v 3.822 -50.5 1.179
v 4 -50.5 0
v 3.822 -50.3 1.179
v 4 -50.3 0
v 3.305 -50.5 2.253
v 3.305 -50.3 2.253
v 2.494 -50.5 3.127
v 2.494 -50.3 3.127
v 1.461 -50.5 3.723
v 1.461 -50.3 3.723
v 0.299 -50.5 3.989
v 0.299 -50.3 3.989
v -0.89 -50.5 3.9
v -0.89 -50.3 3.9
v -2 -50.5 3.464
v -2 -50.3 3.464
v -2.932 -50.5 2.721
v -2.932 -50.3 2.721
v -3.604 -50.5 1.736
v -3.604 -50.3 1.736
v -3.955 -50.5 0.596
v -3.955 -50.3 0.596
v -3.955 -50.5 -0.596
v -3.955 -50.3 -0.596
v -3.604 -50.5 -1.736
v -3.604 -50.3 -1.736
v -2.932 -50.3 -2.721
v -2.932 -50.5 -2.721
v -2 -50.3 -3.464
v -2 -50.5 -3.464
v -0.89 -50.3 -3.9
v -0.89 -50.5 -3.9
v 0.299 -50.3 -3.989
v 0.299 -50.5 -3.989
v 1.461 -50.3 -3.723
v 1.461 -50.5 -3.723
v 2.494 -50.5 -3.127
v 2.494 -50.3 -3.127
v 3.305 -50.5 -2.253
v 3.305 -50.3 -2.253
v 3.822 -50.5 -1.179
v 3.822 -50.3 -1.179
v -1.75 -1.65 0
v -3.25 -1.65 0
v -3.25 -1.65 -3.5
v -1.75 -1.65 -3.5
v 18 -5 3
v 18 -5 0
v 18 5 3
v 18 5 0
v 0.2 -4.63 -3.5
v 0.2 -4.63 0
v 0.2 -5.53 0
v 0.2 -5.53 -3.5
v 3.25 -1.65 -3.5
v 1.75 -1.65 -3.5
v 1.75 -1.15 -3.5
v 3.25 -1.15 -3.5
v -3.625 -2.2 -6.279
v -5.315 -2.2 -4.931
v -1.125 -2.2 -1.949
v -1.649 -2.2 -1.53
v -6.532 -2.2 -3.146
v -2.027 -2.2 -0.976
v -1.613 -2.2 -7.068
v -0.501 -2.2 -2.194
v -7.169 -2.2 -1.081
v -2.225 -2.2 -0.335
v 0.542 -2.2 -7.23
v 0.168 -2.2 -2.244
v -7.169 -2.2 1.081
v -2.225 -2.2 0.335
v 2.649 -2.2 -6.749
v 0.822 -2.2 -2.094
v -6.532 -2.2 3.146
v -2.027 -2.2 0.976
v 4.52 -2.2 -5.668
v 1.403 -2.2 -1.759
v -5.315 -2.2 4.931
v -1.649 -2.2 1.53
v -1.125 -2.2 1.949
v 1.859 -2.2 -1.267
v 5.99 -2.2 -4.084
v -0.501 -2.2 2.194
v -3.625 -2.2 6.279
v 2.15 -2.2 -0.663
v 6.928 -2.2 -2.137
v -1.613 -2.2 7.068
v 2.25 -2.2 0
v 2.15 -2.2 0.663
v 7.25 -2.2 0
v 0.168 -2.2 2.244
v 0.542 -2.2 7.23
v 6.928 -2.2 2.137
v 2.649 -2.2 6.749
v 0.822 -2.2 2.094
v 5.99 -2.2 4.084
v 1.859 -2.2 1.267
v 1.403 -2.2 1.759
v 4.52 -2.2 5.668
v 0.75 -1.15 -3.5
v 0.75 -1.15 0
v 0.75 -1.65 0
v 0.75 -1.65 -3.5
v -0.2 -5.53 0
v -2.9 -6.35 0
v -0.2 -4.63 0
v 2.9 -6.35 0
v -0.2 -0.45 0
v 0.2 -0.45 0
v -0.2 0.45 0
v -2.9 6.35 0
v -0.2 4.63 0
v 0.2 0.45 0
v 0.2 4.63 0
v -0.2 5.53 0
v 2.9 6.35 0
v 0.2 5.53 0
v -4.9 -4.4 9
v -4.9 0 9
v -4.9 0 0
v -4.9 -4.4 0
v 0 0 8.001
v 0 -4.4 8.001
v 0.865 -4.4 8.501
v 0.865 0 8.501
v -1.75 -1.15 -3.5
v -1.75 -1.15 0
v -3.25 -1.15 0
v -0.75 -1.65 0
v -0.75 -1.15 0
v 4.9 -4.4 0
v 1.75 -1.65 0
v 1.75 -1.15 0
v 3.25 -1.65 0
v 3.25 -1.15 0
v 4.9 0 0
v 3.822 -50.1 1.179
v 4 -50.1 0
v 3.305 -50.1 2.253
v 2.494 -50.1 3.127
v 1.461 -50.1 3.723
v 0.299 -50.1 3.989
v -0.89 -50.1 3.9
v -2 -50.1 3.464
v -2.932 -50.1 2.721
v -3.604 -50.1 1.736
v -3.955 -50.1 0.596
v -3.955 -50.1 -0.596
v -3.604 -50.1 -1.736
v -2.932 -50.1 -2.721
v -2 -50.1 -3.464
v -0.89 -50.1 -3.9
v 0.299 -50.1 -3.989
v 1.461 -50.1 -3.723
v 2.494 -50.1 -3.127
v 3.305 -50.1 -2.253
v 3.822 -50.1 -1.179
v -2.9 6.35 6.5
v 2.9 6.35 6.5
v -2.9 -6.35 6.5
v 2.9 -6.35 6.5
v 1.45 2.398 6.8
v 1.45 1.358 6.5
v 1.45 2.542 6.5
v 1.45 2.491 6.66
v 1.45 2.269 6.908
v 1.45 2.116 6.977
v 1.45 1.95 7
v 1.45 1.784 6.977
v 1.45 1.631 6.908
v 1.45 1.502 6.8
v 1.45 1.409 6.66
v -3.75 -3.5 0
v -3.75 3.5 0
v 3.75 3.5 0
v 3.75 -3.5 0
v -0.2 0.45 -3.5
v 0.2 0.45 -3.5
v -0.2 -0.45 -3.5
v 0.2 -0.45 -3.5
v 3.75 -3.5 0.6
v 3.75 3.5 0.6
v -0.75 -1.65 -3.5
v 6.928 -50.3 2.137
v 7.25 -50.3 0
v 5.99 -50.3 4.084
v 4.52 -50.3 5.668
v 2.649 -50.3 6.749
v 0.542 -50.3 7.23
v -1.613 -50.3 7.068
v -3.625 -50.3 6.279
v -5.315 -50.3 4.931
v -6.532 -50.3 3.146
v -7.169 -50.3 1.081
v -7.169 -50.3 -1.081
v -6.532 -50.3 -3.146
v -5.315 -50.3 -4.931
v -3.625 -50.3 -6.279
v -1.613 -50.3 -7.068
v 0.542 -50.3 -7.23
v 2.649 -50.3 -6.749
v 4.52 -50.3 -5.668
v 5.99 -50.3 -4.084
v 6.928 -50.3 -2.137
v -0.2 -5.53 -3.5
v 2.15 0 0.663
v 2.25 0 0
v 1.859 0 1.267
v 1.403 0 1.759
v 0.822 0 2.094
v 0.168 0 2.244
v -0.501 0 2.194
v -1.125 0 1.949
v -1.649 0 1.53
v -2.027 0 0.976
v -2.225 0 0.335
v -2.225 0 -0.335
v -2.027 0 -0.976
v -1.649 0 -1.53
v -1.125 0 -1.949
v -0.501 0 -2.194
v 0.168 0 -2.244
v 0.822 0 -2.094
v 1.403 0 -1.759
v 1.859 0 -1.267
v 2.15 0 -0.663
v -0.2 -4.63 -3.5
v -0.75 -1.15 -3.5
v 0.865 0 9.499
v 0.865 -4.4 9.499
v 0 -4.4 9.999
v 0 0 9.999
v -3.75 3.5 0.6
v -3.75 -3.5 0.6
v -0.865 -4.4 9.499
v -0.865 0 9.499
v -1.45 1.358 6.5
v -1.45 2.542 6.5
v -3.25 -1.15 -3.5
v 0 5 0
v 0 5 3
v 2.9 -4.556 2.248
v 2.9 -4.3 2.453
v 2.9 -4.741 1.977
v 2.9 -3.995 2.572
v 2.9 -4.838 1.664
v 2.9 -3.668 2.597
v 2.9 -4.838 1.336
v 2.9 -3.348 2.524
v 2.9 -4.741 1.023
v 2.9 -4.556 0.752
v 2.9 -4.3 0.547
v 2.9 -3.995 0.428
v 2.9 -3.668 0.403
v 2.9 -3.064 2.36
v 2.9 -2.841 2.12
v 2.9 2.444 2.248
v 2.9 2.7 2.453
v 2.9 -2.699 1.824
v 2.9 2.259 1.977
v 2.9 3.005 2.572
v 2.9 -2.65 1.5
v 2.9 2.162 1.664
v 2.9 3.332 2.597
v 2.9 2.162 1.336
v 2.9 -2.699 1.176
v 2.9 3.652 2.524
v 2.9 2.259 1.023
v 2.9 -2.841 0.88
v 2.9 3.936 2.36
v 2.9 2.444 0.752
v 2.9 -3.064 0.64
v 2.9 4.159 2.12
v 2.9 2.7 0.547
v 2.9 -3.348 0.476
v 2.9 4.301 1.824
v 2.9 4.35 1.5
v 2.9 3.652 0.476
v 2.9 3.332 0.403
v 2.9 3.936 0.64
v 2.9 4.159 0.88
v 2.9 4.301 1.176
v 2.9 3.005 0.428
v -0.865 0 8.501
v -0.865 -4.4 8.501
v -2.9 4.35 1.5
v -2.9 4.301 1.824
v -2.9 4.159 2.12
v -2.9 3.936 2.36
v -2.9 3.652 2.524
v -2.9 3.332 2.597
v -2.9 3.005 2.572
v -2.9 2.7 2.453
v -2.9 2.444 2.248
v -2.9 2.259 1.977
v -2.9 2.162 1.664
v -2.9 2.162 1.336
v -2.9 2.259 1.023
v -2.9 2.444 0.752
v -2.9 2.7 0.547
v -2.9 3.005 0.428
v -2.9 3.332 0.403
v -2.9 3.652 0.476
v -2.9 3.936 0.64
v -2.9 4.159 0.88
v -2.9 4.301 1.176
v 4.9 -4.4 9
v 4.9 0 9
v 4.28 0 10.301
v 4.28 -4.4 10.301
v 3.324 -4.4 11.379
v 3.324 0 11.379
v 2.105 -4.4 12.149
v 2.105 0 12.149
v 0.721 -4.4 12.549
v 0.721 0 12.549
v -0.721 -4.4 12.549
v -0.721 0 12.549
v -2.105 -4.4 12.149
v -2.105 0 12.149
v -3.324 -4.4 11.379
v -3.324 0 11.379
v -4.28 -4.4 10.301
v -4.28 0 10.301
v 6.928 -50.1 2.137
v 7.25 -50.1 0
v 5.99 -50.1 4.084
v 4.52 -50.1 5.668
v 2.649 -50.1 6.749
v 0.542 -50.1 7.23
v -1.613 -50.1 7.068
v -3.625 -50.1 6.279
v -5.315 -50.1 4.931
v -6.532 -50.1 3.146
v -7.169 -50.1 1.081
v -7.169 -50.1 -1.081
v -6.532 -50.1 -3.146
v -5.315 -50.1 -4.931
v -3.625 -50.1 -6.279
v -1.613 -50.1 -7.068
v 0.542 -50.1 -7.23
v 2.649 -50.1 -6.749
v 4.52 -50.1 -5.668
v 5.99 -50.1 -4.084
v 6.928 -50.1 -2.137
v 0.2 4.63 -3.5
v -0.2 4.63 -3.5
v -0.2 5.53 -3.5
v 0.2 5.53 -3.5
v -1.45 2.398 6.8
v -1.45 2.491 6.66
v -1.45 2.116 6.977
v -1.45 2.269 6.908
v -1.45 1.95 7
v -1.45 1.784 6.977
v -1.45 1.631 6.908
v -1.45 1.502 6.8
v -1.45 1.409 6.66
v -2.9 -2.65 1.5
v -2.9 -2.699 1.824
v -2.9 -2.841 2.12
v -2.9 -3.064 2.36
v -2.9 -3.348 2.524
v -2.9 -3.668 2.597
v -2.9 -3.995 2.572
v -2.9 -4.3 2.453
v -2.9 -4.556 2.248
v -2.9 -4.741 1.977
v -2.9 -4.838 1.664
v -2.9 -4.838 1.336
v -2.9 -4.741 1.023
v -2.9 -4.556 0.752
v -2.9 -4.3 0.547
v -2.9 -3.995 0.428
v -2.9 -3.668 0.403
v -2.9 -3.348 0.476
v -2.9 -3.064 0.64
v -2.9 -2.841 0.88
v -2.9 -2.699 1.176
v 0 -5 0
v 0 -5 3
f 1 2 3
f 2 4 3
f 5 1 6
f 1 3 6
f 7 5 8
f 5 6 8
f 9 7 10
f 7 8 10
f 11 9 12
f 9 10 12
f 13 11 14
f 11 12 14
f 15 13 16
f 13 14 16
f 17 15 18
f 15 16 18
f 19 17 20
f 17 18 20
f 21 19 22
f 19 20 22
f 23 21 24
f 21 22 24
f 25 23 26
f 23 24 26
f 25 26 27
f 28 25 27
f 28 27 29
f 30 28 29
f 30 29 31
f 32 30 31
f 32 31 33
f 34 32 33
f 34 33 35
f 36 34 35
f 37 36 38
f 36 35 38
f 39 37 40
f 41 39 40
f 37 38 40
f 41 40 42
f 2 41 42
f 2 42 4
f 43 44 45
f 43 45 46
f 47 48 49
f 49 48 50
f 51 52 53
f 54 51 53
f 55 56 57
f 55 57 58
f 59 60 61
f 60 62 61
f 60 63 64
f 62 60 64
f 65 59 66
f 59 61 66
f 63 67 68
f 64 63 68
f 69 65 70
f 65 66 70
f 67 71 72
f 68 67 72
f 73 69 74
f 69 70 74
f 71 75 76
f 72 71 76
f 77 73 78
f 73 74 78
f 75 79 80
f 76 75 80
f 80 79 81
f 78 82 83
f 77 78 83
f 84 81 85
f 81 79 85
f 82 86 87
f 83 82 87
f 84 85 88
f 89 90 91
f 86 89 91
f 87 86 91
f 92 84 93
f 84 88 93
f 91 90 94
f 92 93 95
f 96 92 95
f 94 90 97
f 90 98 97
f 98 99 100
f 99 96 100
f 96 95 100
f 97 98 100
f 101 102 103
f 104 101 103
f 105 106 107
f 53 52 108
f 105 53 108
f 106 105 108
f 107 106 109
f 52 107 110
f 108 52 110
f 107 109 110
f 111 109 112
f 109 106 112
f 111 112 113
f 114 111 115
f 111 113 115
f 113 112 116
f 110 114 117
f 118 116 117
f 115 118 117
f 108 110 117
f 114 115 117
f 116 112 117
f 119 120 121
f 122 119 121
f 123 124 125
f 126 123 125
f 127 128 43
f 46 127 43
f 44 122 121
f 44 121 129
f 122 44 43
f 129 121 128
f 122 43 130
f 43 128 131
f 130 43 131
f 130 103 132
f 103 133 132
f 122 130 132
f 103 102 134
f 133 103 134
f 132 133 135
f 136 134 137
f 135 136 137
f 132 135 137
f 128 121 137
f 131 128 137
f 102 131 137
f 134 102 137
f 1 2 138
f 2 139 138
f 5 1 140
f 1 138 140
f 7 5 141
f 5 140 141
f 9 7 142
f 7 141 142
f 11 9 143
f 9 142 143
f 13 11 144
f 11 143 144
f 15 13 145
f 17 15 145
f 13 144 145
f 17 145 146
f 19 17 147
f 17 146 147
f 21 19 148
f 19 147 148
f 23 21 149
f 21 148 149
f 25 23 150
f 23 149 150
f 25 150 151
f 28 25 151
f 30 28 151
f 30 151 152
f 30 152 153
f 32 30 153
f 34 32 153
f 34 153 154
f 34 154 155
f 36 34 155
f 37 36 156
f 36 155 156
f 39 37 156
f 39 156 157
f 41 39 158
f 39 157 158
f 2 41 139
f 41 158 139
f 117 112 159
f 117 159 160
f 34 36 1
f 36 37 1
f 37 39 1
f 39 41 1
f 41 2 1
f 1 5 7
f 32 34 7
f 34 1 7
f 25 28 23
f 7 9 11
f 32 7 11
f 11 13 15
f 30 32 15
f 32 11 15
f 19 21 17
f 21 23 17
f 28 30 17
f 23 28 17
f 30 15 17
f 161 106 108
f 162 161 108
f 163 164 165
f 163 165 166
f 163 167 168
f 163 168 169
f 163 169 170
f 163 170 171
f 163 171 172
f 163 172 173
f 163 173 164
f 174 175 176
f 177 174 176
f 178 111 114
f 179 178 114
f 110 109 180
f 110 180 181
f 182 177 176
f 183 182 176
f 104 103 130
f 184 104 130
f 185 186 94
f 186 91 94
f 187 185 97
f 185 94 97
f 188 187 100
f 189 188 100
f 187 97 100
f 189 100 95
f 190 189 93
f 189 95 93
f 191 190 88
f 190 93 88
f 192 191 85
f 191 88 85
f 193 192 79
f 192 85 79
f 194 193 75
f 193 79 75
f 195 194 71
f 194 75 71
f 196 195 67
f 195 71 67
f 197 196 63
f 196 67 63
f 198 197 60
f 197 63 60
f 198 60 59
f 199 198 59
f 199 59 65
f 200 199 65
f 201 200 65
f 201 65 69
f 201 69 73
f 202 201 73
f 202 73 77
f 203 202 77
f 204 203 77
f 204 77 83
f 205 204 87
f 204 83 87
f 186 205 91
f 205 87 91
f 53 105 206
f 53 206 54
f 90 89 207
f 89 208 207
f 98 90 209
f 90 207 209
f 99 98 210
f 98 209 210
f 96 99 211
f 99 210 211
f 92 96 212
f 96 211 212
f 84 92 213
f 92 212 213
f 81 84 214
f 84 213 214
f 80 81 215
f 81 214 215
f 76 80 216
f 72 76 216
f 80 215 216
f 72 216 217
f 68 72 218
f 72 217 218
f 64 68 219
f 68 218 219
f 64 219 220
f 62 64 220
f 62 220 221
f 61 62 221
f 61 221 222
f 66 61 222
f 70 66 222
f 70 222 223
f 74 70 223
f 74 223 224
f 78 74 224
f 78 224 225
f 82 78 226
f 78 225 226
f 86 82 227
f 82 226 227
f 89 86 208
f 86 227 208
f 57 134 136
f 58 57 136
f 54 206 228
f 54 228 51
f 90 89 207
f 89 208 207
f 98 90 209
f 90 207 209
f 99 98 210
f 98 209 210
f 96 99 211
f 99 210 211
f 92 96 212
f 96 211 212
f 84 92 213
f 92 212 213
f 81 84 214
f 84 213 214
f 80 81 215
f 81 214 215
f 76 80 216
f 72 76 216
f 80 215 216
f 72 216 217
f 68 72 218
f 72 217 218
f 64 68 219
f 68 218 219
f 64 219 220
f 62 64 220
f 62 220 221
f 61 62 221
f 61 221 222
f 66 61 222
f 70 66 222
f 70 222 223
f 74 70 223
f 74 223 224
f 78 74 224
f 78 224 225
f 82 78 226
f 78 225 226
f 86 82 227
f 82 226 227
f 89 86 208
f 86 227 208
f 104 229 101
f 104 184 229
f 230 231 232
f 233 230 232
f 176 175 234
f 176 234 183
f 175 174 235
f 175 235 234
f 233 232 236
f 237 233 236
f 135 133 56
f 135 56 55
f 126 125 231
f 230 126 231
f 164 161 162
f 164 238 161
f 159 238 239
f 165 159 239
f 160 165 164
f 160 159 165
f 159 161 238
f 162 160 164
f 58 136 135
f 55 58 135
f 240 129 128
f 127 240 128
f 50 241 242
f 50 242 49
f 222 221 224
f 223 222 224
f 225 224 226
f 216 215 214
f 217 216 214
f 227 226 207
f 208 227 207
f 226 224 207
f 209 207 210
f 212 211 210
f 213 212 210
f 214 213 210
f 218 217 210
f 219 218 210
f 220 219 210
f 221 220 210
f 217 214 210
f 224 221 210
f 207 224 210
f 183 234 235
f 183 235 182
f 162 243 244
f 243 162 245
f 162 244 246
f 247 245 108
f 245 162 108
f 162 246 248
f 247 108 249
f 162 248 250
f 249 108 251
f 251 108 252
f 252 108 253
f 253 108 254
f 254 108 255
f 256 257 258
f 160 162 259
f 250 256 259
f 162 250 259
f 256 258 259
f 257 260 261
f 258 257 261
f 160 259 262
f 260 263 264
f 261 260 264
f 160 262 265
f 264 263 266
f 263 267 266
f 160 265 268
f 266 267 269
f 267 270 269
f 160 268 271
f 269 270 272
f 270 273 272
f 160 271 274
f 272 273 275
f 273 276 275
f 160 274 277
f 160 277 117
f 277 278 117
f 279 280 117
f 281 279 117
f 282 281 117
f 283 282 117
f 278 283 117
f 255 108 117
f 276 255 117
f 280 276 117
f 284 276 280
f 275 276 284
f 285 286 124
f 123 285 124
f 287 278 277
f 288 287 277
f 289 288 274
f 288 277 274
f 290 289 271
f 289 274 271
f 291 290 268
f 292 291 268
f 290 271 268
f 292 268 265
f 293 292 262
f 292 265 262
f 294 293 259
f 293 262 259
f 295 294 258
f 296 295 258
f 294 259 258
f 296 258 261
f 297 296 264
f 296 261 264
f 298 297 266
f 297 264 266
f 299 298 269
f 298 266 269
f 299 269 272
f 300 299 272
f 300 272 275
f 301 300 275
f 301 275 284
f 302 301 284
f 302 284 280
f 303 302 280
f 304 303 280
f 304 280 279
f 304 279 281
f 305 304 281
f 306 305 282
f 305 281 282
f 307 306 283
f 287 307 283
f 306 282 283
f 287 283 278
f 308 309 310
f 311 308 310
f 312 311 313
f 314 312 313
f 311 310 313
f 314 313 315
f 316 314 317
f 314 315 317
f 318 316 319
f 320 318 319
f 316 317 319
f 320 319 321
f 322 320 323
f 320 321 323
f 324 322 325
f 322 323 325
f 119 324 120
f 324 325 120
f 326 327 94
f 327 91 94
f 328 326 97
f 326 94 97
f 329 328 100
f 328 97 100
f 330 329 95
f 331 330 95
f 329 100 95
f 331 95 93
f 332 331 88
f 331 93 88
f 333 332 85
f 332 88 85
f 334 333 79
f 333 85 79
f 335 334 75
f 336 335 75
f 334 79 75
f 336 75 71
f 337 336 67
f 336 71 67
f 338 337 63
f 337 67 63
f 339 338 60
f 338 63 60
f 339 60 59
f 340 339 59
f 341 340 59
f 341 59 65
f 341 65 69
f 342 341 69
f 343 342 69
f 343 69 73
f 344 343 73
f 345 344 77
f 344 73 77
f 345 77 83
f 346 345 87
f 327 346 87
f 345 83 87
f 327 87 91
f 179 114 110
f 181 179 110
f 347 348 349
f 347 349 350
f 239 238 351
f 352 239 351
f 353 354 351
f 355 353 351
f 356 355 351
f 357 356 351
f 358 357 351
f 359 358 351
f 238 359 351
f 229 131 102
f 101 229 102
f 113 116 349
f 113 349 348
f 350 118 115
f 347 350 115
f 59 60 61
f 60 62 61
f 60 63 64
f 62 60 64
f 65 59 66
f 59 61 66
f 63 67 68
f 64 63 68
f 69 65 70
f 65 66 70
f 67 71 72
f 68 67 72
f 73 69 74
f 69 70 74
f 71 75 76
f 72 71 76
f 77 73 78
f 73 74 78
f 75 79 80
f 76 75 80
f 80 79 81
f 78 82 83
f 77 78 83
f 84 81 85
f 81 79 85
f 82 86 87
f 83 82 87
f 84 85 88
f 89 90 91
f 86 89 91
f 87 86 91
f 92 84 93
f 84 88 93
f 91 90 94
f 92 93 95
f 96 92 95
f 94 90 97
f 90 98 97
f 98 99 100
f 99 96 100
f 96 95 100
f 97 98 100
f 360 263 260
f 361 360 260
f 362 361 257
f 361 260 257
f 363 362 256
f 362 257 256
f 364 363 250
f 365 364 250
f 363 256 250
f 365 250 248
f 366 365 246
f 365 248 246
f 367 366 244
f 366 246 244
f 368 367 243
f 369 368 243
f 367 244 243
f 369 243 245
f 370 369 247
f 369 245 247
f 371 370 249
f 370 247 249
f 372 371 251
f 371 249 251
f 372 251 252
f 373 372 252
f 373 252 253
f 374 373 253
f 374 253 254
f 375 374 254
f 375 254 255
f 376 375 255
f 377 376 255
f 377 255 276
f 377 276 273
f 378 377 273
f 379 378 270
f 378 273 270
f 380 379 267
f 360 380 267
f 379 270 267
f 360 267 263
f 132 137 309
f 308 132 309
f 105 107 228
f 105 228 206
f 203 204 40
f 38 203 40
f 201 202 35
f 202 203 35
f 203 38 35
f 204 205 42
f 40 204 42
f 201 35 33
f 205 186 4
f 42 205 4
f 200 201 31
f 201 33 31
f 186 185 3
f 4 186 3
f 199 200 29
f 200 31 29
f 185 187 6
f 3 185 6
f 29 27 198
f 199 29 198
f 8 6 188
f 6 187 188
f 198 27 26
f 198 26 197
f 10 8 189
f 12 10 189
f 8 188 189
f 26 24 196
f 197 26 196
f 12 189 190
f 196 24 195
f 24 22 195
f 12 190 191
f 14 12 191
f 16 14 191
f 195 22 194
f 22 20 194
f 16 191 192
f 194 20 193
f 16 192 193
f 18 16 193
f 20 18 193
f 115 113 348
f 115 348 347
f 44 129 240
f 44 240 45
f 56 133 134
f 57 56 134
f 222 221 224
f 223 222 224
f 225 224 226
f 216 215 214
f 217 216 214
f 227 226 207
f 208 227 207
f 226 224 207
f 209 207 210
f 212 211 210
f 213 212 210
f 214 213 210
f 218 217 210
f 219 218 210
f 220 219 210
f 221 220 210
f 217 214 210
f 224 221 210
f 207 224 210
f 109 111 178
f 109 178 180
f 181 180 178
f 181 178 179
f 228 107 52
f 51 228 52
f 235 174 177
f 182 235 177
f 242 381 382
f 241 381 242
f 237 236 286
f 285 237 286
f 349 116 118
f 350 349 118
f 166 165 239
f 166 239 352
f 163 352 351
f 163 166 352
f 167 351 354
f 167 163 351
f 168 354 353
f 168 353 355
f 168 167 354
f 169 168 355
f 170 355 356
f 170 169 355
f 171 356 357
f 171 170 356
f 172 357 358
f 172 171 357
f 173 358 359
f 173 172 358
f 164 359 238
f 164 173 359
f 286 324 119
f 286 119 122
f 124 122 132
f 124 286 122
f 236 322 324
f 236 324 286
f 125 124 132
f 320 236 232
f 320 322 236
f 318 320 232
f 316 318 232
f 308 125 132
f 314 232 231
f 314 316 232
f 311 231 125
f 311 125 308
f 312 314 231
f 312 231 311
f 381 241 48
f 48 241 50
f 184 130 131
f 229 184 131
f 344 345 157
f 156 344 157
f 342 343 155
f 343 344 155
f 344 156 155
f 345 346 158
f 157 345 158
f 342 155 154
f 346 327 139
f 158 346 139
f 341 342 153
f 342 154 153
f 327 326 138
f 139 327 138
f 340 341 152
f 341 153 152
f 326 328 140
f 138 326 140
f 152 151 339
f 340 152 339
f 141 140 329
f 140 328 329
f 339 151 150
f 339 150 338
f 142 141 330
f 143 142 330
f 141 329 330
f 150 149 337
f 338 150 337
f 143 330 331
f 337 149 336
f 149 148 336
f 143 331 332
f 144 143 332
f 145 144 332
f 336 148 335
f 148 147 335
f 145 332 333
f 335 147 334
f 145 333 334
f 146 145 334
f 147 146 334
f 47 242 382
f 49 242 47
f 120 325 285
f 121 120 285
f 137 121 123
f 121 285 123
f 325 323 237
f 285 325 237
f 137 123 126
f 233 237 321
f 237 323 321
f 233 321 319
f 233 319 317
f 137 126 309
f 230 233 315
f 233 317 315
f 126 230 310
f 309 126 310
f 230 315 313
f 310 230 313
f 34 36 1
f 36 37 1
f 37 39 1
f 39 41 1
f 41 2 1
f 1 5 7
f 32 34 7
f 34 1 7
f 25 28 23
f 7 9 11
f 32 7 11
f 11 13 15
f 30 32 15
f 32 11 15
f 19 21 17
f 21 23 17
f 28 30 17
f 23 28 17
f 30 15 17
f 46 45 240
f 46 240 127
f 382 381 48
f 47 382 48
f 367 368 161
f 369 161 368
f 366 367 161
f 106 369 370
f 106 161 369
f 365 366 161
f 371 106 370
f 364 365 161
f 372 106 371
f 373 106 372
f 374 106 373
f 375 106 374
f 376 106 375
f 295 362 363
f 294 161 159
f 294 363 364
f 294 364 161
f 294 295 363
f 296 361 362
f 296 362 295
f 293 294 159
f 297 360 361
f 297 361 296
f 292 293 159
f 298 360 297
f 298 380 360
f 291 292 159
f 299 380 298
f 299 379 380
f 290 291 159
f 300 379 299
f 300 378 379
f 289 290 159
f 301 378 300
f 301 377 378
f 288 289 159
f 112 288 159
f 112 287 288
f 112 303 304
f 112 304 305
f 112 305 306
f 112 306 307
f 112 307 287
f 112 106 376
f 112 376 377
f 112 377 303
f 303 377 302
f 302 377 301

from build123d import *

# Parameters (mm, degrees)
F0_W      = 5.8
F0_H      = 12.7
F1_DEPTH  = 6.5
F2_W      = 0.4
F2_H      = 0.9
F3_DEPTH  = 3.5
F4_R      = 0.6
F5_DEPTH  = 1.45
F6_R      = 1.1
F7_DEPTH  = 5.8
F10_W     = 18
F10_H     = 10
F11_DEPTH = 3
F12_W     = 7.5
F12_H     = 7
F13_DEPTH = 0.6
F15_DEPTH = 4.4
F17_DEPTH = 4.4
F18_W     = 1.5
F18_H     = 0.25
F18_H_2   = 0.5
F19_DEPTH = 3.5


with BuildPart() as f1:
    # F0 (on Top) → F1 (new body)
    with BuildSketch(Plane.XY):
        Rectangle(F0_W, F0_H)
    extrude(amount=F1_DEPTH)

    # F2 (on face) → F3 (join)
    with BuildSketch(Plane(origin=(0, 0, 0), x_dir=(1, 0, 0), z_dir=(0, 0, -1))):
        with Locations((0, 5.08)):
            Rectangle(F2_W, F2_H)
        Rectangle(F2_W, F2_H)
        with Locations((0, -5.08)):
            Rectangle(F2_W, F2_H)
    extrude(amount=F3_DEPTH)

    # F4 (on Right) → F5 (join, symmetric)
    with BuildSketch(Plane.YZ):
        with Locations((1.95, 6.4)):
            Circle(F4_R)
    extrude(amount=F5_DEPTH, both=True)

    # F6 (on face) → F7 (cut, through all)
    with BuildSketch(Plane.YZ.offset(2.9)):
        with Locations((3.25, 1.5)):
            Circle(F6_R)
        with Locations((-3.75, 1.5)):
            Circle(F6_R)
    extrude(amount=-F7_DEPTH, mode=Mode.SUBTRACT)


with BuildPart() as f9:
    # F8 (on Top) → F9 (revolve)
    with BuildSketch(Plane.XY):
        Polygon((2.25, 0), (0, 0), (0, -50.5), (4, -50.5), (4, -50.3), (7.25, -50.3), (7.25, -2.2), (2.25, -2.2), align=None)
    revolve(axis=Axis((0, 14.5285641775, 0), (0, -1, 0)))


with BuildPart() as f11:
    # F10 (on Top) → F11 (new body)
    with BuildSketch(Plane.XY):
        with Locations((9, 0)):
            Rectangle(F10_W, F10_H)
    extrude(amount=F11_DEPTH)


with BuildPart() as f13:
    # F12 (on Top) → F13 (new body)
    with BuildSketch(Plane.XY):
        Rectangle(F12_W, F12_H)
    extrude(amount=F13_DEPTH)


with BuildPart() as f15:
    # F14 (on Front) → F15 (new body)
    with BuildSketch(Plane.XZ):
        with BuildLine():
            Line((-4.9, 0), (4.9, 0))
            Line((4.9, 0), (4.9, 9))
            ThreePointArc((4.9, 9), (0, 12.6), (-4.9, 9))
            Line((-4.9, 9), (-4.9, 0))
        make_face()
    extrude(amount=F15_DEPTH)

    # F16 (on face) → F17 (cut, through all)
    with BuildSketch(Plane.XZ.offset(4.4)):
        Polygon((0.865, 9.4994079828), (0, 9.9988159657), (-0.865, 9.4994079828), (-0.865, 8.5005920172), (0, 8.0011840343), (0.865, 8.5005920172), align=None)
    extrude(amount=-F17_DEPTH, mode=Mode.SUBTRACT)

    # F18 (on face) → F19 (join)
    with BuildSketch(Plane(origin=(0, 0, 0), x_dir=(1, 0, 0), z_dir=(0, 0, -1))):
        with Locations((2.5, 1.525)):
            Rectangle(F18_W, F18_H)
        with Locations((2.5, 1.275)):
            Rectangle(F18_W, F18_H)
        Polygon((-0.75, 1.15), (0.75, 1.15), (0.75, 1.4), (0.75, 1.65), (-0.75, 1.65), align=None)
        with Locations((-2.5, 1.4)):
            Rectangle(F18_W, F18_H_2)
    extrude(amount=F19_DEPTH)


with BuildPart() as f21:
    # F20 (on Top) → F21 (revolve)
    with BuildSketch(Plane.XY):
        Polygon((2.25, 0), (0, 0), (0, -50.5), (4, -50.5), (4, -50.1), (7.25, -50.1), (7.25, -2.2), (2.25, -2.2), align=None)
    revolve(axis=Axis((0, -25.25, 0), (0, -1, 0)))


solid = Compound([f1.part, f9.part, f11.part, f13.part, f15.part, f21.part])
